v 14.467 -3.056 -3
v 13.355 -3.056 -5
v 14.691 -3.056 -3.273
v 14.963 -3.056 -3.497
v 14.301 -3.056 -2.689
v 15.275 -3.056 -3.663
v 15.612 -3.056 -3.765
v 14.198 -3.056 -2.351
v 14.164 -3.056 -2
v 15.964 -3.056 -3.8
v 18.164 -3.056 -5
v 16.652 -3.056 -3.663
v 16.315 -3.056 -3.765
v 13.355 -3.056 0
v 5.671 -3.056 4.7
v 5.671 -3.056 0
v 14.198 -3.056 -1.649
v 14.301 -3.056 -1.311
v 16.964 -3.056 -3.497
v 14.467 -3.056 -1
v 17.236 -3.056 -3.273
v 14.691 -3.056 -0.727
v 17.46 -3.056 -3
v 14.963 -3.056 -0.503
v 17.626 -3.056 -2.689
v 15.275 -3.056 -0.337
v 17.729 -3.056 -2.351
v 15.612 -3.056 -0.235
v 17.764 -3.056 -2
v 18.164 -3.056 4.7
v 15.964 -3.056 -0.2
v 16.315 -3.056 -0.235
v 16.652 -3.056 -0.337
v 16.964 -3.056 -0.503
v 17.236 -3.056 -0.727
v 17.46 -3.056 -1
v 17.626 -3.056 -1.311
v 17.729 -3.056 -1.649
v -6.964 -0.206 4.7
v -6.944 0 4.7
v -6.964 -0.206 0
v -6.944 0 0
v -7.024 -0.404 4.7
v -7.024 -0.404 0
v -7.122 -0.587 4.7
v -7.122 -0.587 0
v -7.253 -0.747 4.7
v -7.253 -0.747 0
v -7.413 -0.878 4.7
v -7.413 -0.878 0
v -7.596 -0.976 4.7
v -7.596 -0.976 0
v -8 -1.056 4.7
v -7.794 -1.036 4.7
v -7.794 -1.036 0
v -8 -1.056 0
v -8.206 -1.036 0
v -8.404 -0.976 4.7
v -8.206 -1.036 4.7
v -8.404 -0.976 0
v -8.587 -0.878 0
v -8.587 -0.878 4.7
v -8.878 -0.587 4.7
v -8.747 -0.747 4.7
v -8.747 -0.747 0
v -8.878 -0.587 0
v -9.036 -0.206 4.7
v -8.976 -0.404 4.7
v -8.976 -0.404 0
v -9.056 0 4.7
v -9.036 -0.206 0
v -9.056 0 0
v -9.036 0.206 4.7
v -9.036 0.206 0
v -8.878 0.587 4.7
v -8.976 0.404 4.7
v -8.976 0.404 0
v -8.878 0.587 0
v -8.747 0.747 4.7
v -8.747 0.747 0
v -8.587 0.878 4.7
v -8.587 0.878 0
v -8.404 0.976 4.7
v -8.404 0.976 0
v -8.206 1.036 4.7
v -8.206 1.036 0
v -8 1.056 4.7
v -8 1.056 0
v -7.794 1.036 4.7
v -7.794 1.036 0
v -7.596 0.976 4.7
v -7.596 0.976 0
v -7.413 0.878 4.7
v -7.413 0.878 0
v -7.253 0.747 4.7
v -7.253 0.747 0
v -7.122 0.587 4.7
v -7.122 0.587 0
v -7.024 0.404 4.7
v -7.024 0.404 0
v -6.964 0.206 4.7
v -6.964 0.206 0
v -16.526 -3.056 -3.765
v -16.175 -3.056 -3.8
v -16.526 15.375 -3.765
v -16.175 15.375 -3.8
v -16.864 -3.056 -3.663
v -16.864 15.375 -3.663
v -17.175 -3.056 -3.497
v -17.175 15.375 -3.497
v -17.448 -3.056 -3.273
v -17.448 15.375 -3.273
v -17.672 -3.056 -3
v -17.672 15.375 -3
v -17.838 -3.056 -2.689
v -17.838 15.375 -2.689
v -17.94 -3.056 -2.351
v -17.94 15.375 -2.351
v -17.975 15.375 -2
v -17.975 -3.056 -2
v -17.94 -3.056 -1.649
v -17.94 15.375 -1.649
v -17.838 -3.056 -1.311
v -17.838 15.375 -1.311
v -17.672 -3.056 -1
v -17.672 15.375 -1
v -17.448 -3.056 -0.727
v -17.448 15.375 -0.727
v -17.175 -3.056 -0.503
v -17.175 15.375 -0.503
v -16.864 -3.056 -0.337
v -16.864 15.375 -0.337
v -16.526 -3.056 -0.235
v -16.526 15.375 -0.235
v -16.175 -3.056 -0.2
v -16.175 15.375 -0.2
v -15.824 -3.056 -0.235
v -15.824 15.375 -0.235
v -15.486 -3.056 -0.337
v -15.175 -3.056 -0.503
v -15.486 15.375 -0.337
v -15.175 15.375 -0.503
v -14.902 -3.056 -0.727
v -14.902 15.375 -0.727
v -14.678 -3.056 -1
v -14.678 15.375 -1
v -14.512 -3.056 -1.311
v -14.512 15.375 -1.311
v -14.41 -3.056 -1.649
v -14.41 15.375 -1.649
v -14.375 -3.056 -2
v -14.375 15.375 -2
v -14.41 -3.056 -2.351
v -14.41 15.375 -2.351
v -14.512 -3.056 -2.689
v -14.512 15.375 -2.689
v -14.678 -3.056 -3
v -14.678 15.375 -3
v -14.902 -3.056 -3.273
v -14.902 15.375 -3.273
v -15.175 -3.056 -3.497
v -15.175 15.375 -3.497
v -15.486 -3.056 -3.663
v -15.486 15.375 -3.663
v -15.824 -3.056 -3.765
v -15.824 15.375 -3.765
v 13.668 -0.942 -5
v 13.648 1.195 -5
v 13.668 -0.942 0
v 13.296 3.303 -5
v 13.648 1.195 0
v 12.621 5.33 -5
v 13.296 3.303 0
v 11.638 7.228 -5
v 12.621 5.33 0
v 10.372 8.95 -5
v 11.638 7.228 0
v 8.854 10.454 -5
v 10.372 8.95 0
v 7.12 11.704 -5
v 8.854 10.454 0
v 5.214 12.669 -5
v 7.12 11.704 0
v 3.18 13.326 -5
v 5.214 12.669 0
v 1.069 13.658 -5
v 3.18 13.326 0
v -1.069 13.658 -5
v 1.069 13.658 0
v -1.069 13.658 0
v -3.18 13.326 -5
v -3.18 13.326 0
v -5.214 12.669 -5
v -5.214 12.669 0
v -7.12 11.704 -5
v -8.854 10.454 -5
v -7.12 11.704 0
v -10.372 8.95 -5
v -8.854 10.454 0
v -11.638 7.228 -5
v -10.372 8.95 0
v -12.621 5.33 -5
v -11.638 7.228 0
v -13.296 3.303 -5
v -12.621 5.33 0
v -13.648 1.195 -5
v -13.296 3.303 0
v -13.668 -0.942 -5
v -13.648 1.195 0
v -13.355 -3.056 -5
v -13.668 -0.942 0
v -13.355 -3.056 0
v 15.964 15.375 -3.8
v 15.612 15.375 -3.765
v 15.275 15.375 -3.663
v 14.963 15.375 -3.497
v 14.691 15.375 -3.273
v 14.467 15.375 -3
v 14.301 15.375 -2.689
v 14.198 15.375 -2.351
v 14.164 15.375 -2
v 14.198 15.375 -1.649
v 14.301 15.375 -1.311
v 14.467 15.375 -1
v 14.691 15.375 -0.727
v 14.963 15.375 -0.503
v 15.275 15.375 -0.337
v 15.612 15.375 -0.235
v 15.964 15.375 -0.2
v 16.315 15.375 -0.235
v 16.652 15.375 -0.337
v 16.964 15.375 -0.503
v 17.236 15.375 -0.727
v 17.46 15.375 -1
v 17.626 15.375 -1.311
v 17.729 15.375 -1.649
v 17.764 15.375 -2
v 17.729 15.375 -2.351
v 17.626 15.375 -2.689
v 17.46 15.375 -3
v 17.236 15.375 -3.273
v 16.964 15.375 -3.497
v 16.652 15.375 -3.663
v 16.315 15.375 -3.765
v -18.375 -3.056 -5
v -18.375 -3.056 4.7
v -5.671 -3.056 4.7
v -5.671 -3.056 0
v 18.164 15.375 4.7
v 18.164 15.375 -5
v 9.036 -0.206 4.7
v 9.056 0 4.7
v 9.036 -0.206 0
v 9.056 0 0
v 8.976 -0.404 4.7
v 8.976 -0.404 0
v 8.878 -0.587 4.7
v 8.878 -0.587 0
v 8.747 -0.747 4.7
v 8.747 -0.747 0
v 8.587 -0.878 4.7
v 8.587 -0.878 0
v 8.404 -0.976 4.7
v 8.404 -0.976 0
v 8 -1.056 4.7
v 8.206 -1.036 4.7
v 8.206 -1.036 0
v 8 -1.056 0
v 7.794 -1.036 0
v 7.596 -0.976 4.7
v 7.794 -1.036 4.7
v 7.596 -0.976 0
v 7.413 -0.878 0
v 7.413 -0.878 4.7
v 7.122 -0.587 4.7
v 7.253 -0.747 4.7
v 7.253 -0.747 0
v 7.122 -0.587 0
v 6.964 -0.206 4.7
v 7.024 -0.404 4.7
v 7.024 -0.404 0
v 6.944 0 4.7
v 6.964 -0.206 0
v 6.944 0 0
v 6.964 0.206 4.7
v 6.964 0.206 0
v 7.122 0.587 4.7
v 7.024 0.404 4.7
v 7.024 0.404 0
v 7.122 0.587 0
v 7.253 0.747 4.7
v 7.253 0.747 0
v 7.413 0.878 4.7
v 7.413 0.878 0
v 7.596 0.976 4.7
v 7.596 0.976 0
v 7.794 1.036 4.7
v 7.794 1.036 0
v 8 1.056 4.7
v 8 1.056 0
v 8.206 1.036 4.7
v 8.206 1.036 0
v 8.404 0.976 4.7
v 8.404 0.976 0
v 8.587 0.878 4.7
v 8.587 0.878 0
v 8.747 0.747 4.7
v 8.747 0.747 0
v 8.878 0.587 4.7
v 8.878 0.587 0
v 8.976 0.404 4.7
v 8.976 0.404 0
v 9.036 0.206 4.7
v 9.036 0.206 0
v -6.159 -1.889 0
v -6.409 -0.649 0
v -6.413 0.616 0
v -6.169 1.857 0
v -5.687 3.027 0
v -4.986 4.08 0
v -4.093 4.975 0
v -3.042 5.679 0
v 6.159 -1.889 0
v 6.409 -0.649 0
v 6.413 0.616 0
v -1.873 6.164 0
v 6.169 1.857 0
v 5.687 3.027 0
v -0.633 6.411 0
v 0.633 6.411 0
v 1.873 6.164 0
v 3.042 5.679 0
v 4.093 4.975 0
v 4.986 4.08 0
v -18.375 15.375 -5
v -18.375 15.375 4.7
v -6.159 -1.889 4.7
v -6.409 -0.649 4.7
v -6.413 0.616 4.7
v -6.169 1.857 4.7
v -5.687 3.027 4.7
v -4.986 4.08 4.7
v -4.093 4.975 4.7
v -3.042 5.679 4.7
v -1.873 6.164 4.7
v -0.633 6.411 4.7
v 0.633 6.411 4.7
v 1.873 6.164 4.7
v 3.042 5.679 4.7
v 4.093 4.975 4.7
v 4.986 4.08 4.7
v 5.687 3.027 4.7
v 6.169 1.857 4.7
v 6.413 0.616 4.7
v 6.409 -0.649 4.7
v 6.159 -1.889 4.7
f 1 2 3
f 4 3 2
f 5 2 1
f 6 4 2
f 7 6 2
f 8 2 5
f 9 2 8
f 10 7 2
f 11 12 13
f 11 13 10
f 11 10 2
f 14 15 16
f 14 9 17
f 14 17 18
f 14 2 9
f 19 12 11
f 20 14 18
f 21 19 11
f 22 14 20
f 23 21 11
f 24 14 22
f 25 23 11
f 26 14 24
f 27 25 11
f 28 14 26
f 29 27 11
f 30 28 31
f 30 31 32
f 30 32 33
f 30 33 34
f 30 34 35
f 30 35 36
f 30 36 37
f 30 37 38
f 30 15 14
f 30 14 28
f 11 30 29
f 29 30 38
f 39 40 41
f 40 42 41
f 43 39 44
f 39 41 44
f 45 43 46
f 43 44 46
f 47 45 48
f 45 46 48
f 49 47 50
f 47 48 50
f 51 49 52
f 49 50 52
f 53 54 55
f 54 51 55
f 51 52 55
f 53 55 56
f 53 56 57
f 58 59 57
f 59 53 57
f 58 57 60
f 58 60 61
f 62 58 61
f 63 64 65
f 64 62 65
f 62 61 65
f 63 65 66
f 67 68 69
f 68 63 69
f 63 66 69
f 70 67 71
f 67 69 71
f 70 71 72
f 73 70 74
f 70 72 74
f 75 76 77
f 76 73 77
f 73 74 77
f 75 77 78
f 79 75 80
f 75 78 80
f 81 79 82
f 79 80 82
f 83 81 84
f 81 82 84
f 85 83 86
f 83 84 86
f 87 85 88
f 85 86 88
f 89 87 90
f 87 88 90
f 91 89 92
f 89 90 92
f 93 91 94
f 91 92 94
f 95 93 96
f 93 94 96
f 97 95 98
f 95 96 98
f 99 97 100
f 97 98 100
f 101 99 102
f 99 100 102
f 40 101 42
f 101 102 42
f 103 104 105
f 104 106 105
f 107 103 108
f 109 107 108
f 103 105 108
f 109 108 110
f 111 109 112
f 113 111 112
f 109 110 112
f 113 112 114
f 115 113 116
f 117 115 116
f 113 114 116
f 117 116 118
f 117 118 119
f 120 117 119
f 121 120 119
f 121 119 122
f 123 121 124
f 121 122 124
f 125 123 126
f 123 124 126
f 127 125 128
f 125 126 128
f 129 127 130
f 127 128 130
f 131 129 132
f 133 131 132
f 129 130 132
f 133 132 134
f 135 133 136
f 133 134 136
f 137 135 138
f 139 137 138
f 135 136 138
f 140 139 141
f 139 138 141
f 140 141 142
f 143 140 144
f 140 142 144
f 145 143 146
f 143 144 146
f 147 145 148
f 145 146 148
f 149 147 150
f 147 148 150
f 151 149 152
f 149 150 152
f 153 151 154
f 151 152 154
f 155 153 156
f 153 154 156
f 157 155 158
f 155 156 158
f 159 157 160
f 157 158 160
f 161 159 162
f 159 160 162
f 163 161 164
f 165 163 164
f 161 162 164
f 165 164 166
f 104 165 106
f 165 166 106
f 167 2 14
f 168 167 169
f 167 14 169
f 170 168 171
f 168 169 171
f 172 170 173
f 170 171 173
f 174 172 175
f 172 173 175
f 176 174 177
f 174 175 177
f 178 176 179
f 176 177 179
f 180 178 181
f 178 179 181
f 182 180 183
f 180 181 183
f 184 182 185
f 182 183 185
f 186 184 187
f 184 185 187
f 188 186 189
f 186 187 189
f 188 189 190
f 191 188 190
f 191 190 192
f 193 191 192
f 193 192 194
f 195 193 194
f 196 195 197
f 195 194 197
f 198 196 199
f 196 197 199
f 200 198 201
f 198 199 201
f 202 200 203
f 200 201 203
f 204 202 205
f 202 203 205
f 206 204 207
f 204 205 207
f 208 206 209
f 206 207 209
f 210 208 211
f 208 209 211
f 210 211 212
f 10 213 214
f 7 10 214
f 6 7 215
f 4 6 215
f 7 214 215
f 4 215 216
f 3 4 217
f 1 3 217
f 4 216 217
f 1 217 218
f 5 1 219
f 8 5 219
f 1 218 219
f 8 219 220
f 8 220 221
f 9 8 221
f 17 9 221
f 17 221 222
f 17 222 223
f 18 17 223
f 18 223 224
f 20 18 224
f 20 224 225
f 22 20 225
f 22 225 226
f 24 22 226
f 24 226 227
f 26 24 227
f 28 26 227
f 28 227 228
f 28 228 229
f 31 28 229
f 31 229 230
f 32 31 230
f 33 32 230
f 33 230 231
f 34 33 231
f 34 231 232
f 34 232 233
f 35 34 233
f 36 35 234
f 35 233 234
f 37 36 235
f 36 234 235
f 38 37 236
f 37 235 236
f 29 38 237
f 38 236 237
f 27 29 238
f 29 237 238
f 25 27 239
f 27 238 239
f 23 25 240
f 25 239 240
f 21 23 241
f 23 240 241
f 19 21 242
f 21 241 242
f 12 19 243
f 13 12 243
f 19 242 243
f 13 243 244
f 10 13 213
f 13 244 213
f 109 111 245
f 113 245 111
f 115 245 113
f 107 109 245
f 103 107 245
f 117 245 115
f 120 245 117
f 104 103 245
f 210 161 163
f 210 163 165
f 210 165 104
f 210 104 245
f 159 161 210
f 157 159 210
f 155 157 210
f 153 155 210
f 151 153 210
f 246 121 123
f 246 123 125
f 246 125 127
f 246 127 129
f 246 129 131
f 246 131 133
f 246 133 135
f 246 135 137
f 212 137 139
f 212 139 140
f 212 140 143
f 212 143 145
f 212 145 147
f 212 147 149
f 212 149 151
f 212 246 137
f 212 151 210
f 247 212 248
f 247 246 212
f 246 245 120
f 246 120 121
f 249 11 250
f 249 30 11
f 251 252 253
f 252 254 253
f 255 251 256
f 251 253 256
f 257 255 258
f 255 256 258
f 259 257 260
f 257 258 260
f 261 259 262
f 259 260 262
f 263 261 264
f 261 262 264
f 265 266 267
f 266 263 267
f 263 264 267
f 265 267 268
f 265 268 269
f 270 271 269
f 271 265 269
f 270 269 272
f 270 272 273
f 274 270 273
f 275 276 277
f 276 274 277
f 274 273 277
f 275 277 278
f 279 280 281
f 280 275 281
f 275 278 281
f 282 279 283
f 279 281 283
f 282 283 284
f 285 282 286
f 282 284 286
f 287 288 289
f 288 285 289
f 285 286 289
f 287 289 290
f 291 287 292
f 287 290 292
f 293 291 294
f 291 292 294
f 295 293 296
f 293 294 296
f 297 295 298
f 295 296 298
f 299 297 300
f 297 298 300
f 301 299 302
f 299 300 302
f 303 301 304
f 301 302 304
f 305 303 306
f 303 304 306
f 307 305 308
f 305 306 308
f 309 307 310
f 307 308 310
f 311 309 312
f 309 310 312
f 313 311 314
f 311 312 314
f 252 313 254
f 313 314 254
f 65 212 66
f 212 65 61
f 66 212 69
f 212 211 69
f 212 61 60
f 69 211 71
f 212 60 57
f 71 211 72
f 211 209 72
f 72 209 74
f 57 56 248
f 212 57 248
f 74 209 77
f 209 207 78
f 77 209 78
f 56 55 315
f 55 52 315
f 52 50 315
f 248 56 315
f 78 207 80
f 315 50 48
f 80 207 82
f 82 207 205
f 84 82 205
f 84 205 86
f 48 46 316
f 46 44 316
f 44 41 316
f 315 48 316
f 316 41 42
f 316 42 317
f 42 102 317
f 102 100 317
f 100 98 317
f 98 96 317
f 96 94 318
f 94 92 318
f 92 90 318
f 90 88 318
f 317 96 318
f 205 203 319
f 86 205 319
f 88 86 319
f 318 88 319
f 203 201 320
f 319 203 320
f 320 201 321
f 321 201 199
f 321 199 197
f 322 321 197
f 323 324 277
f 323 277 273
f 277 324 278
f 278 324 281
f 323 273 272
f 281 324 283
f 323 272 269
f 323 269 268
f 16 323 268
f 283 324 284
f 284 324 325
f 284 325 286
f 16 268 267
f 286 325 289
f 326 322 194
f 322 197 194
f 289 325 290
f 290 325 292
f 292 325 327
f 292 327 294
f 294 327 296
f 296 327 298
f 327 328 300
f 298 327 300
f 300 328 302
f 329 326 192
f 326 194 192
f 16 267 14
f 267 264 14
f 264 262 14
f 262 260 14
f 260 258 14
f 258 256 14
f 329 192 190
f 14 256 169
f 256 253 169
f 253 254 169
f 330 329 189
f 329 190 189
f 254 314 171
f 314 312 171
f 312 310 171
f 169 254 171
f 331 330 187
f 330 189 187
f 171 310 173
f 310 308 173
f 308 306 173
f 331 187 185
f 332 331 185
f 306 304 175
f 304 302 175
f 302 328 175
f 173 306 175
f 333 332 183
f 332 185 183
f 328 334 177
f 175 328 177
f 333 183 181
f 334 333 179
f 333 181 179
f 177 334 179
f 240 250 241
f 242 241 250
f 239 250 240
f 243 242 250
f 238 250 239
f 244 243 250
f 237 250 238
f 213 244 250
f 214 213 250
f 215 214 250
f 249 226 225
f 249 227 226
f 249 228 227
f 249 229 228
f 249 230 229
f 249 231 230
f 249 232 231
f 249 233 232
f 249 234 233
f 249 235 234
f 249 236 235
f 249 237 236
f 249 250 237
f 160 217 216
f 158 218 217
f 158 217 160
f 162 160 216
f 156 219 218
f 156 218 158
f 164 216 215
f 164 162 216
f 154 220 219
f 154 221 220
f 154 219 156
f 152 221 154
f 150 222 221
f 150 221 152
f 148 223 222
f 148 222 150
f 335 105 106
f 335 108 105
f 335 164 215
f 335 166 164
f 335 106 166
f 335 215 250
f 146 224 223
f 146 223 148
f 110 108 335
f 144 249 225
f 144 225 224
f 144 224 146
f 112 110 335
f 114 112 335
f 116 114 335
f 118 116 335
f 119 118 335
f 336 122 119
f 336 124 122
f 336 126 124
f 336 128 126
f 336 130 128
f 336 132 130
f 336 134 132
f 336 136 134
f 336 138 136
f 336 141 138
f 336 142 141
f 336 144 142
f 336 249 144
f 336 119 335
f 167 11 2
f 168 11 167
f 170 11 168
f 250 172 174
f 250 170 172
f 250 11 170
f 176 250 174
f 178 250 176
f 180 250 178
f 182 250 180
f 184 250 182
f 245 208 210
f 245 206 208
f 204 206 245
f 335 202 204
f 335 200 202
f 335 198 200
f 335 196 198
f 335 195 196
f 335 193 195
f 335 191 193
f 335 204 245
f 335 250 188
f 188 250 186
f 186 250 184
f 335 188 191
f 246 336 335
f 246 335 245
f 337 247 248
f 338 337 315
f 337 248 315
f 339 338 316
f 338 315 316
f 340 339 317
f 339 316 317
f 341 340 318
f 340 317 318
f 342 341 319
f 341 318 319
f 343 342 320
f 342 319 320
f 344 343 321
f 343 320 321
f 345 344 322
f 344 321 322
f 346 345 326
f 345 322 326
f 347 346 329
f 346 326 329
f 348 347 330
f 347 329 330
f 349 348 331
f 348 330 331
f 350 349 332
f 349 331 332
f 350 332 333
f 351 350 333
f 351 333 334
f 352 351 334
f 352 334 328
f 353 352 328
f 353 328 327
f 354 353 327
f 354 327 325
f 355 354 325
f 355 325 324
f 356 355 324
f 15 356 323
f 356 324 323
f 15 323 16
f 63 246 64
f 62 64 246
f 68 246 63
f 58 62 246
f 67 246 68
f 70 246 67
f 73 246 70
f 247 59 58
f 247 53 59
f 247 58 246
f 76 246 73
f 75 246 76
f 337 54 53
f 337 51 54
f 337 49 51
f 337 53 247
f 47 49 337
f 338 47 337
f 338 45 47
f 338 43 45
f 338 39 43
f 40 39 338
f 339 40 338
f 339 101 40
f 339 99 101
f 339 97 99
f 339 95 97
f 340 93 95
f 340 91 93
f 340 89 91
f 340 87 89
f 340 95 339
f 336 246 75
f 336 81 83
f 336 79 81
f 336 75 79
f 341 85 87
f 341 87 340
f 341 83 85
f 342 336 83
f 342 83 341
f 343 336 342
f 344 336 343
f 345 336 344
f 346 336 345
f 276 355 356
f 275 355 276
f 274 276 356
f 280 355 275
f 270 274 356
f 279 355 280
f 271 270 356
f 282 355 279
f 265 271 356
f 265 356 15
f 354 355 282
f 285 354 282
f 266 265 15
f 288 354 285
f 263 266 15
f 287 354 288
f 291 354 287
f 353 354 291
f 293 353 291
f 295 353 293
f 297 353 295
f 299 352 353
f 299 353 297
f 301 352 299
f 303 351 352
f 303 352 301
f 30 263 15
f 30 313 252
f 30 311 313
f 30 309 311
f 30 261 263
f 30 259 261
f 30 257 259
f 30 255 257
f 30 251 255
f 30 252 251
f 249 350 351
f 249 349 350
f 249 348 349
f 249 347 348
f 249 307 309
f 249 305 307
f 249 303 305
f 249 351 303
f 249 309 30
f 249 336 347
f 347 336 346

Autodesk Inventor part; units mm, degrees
ref_plane "YZ Plane" through (0, 0, 0) normal (1, 0, 0) x (0, 1, 0)
ref_plane "Work Plane1" through (0, 0, 0) normal (0, 0, 1) x (1, 0, 0)
sketch "Sketch1" plane through (0, 0, 0) normal (0, 0, 1) x (1, 0, 0)
  circle A0 centre (8, 0) radius 1.0564 projected
  circle A1 centre (-8, 0) radius 1.0564 projected
  circle A2 centre (0, 0) radius 5 projected
  circle A3 centre (0, 0) radius 13.7 projected
  line L0 (-18.375, 15.375) -> (-18.375, 1) projected
  line L1 (-18.375, 1) -> (-13.6635, 1) projected
  arc A4 (13.6635, 1) -> (-13.6635, 1) centre (0, 0) ccw projected
  line L2 (13.6635, 1) -> (18.1635, 1) projected
  line L3 (18.1635, 1) -> (18.1635, 15.375) projected
  line L4 (18.1635, 15.375) -> (-18.375, 15.375) projected
  line L5 (18.1635, 15.375) -> (-18.375, 15.375)
  line L6 (-18.375, 15.375) -> (-18.375, -3.0565)
  line L7 (-18.375, -3.0565) -> (18.1635, -3.0565)
  line L8 (18.1635, -3.0565) -> (18.1635, 15.375)
  line L9 (18.1635, -5.0565) -> (12.7327, -5.0565) projected
  circle A5 centre (0, 0) radius 6.4423
  arc A6 (2.7565, 5.1523) -> (1.2674, 3.6504) centre (5.3281, 1.1135) ccw projected
  arc A7 (1.2674, 3.6504) -> (0.6807, 3.8037) centre (0, 0) ccw projected
  arc A8 (0.6807, 3.8037) -> (0.1169, 5.8421) centre (-4.102, 3.578) ccw projected
  arc A9 (0.1169, 5.8421) -> (-0.7984, 5.7885) centre (0, 0) ccw projected
  arc A10 (-0.7984, 5.7885) -> (-1.1203, 3.6981) centre (3.6561, 4.0326) ccw projected
  arc A11 (-1.1203, 3.6981) -> (-1.685, 3.4774) centre (0, 0) ccw projected
  arc A12 (-1.685, 3.4774) -> (-3.3393, 4.7951) centre (-5.4217, 0.4836) ccw projected
  arc A13 (-3.3393, 4.7951) -> (-4.0483, 4.2137) centre (0, 0) ccw projected
  arc A14 (-4.0483, 4.2137) -> (-3.0801, 2.3334) centre (0.5875, 5.4114) ccw projected
  arc A15 (-3.0801, 2.3334) -> (-3.4072, 1.8228) centre (0, 0) ccw projected
  arc A16 (-3.4072, 1.8228) -> (-5.52, 1.9165) centre (-4.6705, -2.7956) ccw projected
  arc A17 (-5.52, 1.9165) -> (-5.7519, 1.0294) centre (0, 0) ccw projected
  arc A18 (-5.7519, 1.0294) -> (-3.8633, 0.0773) centre (-2.7054, 4.7233) ccw projected
  arc A19 (-3.8633, 0.0773) -> (-3.8279, -0.528) centre (0, 0) ccw projected
  arc A20 (-3.8279, -0.528) -> (-5.5923, -1.6941) centre (-2.1353, -5.0069) ccw projected
  arc A21 (-5.5923, -1.6941) -> (-5.2584, -2.5481) centre (0, 0) ccw projected
  arc A22 (-5.2584, -2.5481) -> (-3.171, -2.2083) centre (-4.965, 2.231) ccw projected
  arc A23 (-3.171, -2.2083) -> (-2.7865, -2.6771) centre (0, 0) ccw projected
  arc A24 (-2.7865, -2.6771) -> (-3.5285, -4.6576) centre (1.2155, -5.3058) ccw projected
  arc A25 (-3.5285, -4.6576) -> (-2.7565, -5.1523) centre (0, 0) ccw projected
  arc A26 (-2.7565, -5.1523) -> (-1.2674, -3.6504) centre (-5.3281, -1.1135) ccw projected
  arc A27 (-1.2674, -3.6504) -> (-0.6807, -3.8037) centre (0, 0) ccw projected
  arc A28 (-0.6807, -3.8037) -> (-0.1169, -5.8421) centre (4.102, -3.578) ccw projected
  arc A29 (-0.1169, -5.8421) -> (0.7984, -5.7885) centre (0, 0) ccw projected
  arc A30 (0.7984, -5.7885) -> (1.1203, -3.6981) centre (-3.6561, -4.0326) ccw projected
  arc A31 (1.1203, -3.6981) -> (1.685, -3.4774) centre (0, 0) ccw projected
  arc A32 (1.685, -3.4774) -> (3.3393, -4.7951) centre (5.4217, -0.4836) ccw projected
  arc A33 (3.3393, -4.7951) -> (4.0483, -4.2137) centre (0, 0) ccw projected
  arc A34 (4.0483, -4.2137) -> (3.0801, -2.3334) centre (-0.5875, -5.4114) ccw projected
  arc A35 (3.0801, -2.3334) -> (3.4072, -1.8228) centre (0, 0) ccw projected
  arc A36 (3.4072, -1.8228) -> (5.52, -1.9165) centre (4.6705, 2.7956) ccw projected
  arc A37 (5.52, -1.9165) -> (5.7519, -1.0294) centre (0, 0) ccw projected
  arc A38 (5.7519, -1.0294) -> (3.8633, -0.0773) centre (2.7054, -4.7233) ccw projected
  arc A39 (3.8633, -0.0773) -> (3.8279, 0.528) centre (0, 0) ccw projected
  arc A40 (3.8279, 0.528) -> (5.5923, 1.6941) centre (2.1353, 5.0069) ccw projected
  arc A41 (5.5923, 1.6941) -> (5.2584, 2.5481) centre (0, 0) ccw projected
  arc A42 (5.2584, 2.5481) -> (3.171, 2.2083) centre (4.965, -2.231) ccw projected
  arc A43 (3.171, 2.2083) -> (2.7865, 2.6771) centre (0, 0) ccw projected
  arc A44 (2.7865, 2.6771) -> (3.5285, 4.6576) centre (-1.2155, 5.3058) ccw projected
  arc A45 (3.5285, 4.6576) -> (2.7565, 5.1523) centre (0, 0) ccw projected
  point P0 (-5.6711, -3.0565)
  point P1 (-6.9927, -0.3186)
  point P2 (-6.9927, 0.3186)
  point P3 (6.9927, 0.3186)
  point P4 (6.9927, -0.3186)
  point P5 (5.6711, -3.0565)
  point P6 (0.3418, -6.4333)
  point P7 (0.3418, -5.8333)
  dimension "d0" = 2
  dimension "d4" = 0.6
ref_plane "Work Plane2" through (-70.375, 15.375, 4.7) normal (0, 0, -1) x (0, 1, 0)
extrude "Extrusion1" add sketch "Sketch1" along normal up to surface (4.7 mm away) contours A5 L7 A3 | A3 L2 L8 L7 | L7 L6 L1 A3 | A3 L1 L0 L4 L3 L2 picked at (8.5523, 7.2456)
sketch "Sketch2" plane through (0, 0, 0) normal (0, 0, -1) x (-1, 0, 0)
  circle A0 centre (-8, 0) radius 1.0564 projected
  circle A1 centre (8, 0) radius 1.0564 projected
  circle A2 centre (0, 0) radius 5 projected
  circle A3 centre (0, 0) radius 13.7 projected
  line L0 (-5.6711, -3.0565) -> (-18.1635, -3.0565) projected
  arc A4 (5.6711, -3.0565) -> (-5.6711, -3.0565) centre (0, 0) ccw projected
  line L1 (18.375, -3.0565) -> (5.6711, -3.0565) projected
  line L2 (18.375, 15.375) -> (18.375, -3.0565) projected
  line L3 (-18.1635, 15.375) -> (18.375, 15.375) projected
  line L4 (-18.1635, -3.0565) -> (-18.1635, 15.375) projected
  circle A5 centre (-8, 0) radius 1.0564 projected
  circle A6 centre (8, 0) radius 1.0564 projected
  point P0 (-13.3547, -3.0565)
  point P1 (13.3547, -3.0565)
ref_plane "Work Plane3" through (-14.375, -14.375, -5) normal (0, 0, 1) x (1, 0, 0)
extrude "Extrusion2" add sketch "Sketch2" along normal up to surface (5 mm away) contours A3 L0 L4 L3 L2 L1
sketch "Sketch3" plane through (5.6711, -3.0565, 4.7) normal (0, -1, 0) x (1, 0, 0)
  circle A0 centre (10.2923, -6.7) radius 1.8 projected
  circle A1 centre (-21.8461, -6.7) radius 1.8 projected
  point P0 (-5.6711, -4.7)
hole "Hole1" at (15.9635, -3.0565, -2) at (-16.175, -3.0565, -2) direction (0, 1, 0) diameter 3.6 end through all counterbore diameter 11 counterbore depth 0 clearance for "Hex Head Cap Screw ISO 24017" size "M3" standard "ISO"
properties part number "right_motor_floor"
